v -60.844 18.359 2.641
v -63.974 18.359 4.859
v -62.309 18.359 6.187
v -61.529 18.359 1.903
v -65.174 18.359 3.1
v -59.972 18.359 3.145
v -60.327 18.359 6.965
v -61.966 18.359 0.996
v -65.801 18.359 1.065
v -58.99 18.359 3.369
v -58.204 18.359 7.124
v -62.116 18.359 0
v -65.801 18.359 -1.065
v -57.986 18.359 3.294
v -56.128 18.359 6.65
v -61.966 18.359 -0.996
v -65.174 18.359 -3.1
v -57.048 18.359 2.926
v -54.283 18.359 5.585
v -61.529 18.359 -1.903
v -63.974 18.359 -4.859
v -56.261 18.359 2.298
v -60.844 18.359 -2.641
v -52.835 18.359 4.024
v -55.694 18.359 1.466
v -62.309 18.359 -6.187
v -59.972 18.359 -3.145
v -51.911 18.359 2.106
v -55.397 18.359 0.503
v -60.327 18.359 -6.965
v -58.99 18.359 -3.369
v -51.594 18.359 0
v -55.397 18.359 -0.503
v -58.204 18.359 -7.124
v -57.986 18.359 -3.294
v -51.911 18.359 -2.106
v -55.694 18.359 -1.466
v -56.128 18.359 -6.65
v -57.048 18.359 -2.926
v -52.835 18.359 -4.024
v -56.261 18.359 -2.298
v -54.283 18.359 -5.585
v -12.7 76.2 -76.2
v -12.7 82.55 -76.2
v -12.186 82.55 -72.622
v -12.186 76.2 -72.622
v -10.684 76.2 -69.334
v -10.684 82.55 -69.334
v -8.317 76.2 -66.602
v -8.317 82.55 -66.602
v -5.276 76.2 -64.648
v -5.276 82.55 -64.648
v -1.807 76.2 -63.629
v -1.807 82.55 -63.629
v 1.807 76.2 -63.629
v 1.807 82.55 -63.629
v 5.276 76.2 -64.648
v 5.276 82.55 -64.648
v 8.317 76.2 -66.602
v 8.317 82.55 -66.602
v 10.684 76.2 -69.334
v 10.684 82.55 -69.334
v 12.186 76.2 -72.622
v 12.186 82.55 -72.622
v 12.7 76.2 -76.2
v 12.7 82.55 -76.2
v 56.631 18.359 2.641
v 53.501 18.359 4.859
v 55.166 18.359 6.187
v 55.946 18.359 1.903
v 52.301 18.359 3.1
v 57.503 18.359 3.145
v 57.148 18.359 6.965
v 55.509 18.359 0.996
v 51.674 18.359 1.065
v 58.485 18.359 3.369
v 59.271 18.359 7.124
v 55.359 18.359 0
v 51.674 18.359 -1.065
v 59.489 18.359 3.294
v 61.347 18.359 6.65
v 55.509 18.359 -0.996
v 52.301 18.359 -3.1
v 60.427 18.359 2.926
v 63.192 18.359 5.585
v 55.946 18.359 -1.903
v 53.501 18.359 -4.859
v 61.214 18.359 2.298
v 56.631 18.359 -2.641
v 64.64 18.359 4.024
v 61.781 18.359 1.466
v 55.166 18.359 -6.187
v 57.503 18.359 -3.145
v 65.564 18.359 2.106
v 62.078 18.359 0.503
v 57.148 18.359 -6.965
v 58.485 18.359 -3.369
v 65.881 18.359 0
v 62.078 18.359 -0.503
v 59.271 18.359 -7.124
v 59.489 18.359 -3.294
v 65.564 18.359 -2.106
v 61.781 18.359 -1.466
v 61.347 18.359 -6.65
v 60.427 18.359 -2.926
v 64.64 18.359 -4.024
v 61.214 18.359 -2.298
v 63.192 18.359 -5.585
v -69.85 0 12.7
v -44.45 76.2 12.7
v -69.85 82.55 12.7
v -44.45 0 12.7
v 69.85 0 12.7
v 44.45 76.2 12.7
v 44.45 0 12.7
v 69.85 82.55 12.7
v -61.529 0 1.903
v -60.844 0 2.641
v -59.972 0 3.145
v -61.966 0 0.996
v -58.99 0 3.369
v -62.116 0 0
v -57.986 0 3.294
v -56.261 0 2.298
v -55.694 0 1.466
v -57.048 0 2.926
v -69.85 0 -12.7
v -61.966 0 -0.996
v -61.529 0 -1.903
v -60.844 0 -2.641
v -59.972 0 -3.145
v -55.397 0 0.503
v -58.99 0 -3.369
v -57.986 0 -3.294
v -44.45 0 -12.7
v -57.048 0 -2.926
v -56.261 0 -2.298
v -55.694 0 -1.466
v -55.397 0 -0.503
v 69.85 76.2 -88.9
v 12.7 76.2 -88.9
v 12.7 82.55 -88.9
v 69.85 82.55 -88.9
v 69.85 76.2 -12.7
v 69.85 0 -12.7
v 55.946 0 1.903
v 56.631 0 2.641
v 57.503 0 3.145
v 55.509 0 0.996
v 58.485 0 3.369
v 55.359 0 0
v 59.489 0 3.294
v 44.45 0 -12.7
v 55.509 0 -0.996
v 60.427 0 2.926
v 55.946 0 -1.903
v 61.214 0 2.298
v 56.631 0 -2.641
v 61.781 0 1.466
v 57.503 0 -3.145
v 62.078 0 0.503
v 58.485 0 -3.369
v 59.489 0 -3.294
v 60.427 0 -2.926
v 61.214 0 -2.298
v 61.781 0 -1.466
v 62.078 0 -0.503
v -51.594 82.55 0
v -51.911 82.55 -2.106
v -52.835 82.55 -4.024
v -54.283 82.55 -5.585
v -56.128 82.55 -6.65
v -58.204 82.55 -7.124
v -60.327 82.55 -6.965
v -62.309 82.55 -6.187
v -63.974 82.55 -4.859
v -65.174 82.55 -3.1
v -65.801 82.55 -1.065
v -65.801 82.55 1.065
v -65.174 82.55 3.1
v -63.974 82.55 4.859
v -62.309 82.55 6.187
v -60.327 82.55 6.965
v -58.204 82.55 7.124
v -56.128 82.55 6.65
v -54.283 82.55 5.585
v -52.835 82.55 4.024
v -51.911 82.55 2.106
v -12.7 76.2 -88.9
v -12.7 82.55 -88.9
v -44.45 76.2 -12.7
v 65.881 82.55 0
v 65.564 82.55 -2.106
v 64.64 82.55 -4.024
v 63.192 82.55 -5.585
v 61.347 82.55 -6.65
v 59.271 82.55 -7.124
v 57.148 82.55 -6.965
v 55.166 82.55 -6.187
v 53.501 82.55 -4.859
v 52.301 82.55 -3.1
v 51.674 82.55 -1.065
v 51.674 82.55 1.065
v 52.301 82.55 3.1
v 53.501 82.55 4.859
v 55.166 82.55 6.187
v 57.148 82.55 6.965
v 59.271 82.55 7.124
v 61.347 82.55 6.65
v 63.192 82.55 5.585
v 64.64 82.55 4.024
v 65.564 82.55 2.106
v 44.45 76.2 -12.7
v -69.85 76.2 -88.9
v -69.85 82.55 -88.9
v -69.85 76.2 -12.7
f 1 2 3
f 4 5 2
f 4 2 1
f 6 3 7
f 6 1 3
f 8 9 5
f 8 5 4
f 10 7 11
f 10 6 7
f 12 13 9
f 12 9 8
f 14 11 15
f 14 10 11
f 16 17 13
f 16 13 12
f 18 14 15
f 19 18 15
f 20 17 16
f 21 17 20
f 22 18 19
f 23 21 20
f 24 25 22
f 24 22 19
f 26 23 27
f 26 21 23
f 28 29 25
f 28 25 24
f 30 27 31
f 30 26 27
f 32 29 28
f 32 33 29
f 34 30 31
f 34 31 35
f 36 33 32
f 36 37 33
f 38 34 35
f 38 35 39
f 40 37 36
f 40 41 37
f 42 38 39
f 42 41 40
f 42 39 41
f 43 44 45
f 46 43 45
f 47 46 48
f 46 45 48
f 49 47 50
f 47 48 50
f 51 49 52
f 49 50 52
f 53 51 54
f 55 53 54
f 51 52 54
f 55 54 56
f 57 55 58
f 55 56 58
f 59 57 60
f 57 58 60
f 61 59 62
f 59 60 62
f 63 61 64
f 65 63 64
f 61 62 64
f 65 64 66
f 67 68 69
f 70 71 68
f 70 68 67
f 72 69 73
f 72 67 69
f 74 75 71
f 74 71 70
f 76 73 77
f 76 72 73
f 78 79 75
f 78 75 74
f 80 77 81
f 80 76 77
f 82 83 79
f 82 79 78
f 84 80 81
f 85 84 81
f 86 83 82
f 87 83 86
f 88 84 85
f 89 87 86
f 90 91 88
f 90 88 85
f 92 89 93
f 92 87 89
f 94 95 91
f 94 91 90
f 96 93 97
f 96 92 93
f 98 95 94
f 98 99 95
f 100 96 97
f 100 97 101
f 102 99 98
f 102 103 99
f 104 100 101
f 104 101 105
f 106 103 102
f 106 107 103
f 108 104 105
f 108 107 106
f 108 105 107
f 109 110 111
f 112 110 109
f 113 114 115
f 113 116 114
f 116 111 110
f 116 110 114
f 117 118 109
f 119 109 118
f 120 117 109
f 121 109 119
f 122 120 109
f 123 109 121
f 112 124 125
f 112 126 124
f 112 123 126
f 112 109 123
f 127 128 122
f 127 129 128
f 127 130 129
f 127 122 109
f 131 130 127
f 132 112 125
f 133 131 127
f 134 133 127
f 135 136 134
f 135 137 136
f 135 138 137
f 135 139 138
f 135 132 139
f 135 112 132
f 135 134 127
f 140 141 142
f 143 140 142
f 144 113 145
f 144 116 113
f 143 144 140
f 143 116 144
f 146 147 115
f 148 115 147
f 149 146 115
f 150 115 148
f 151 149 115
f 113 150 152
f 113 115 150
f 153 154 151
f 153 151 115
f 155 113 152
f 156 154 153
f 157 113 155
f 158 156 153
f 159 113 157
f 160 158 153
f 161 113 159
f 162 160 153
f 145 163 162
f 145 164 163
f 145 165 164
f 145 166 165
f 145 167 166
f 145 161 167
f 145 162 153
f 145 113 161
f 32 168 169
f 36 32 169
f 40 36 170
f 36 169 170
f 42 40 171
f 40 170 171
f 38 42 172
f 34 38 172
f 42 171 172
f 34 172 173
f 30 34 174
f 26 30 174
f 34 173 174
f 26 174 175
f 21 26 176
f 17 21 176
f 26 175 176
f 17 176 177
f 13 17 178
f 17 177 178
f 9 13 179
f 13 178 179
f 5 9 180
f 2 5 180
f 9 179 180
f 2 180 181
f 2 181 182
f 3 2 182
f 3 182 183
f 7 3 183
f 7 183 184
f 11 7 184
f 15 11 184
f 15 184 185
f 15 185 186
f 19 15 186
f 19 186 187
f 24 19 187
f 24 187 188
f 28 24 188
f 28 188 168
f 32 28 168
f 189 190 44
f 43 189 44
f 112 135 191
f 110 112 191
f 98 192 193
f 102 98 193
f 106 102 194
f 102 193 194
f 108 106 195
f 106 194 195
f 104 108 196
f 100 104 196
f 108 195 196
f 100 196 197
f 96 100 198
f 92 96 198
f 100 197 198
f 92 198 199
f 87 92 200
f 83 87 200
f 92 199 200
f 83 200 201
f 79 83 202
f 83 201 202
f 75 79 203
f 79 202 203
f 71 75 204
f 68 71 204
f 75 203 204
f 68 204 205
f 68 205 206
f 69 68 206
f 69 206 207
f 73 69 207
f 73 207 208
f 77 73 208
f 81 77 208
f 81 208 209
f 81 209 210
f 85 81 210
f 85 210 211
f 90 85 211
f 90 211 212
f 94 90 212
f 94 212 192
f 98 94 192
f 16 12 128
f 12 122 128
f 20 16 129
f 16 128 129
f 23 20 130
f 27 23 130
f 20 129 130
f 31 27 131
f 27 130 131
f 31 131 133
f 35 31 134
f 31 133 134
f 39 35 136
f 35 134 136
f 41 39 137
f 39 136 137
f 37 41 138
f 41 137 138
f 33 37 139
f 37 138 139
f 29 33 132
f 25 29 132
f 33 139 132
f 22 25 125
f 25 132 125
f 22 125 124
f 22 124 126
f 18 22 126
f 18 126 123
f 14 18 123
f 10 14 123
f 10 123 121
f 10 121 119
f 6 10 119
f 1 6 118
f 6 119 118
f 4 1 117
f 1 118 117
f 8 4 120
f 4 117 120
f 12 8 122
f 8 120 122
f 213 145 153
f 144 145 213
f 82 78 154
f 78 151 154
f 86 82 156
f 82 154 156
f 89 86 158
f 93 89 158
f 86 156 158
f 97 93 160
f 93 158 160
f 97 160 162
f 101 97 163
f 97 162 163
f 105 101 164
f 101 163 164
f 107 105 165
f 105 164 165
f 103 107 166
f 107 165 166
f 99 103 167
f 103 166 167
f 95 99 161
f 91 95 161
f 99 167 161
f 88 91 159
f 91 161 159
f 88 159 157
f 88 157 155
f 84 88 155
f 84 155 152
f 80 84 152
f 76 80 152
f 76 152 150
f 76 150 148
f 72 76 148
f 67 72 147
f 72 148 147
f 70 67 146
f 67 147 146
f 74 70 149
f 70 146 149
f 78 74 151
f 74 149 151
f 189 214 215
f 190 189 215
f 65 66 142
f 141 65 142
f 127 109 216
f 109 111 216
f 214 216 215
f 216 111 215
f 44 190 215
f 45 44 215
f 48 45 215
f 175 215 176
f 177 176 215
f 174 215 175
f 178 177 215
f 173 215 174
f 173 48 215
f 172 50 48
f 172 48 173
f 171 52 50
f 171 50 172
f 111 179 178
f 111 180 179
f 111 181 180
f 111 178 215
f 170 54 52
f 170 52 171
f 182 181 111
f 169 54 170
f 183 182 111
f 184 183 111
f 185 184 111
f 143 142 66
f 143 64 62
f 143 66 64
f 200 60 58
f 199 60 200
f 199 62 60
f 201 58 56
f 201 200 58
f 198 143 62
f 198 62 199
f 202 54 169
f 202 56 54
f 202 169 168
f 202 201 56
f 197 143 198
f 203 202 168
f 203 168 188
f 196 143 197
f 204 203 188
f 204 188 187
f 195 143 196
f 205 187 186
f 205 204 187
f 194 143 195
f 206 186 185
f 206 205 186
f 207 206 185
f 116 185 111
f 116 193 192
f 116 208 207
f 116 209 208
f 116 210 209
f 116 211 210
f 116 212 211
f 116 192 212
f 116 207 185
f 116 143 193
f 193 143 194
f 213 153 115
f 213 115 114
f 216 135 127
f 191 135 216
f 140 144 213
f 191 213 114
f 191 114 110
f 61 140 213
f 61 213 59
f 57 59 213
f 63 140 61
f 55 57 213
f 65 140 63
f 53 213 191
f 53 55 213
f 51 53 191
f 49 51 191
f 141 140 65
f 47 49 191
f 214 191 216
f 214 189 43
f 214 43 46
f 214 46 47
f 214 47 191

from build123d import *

# Parameters (mm, degrees)
BOSS_EXTRUDE1_DEPTH                                  = 69.85
SKETCH2_W                                            = 88.9
SKETCH2_H                                            = 76.2
CUT_EXTRUDE1_DEPTH                                   = 149.378182358
CBORE_FOR_1_4_BINDING_HEAD_MACHINE_SCREW_D           = 6.7564
CBORE_FOR_1_4_BINDING_HEAD_MACHINE_SCREW_CBORE_D     = 14.2875
CBORE_FOR_1_4_BINDING_HEAD_MACHINE_SCREW_CBORE_DEPTH = 64.191007
CUT_EXTRUDE2_DEPTH                                   = 140.9883388


with BuildPart() as part:
    # Sketch1 → Boss-Extrude1 (new, symmetric)
    with BuildSketch(Plane(origin=(0, 0, 0), x_dir=(0, 0, -1), z_dir=(1, 0, 0))):
        Polygon((-12.7, 0), (12.7, 0), (12.7, 76.2), (88.9, 76.2), (88.9, 82.55), (-12.7, 82.55), align=None)
    extrude(amount=BOSS_EXTRUDE1_DEPTH, both=True)

    # Sketch2 → Cut-Extrude1 (cut, through all)
    with BuildSketch(Plane(origin=(0, 0, -88.9), x_dir=(-1, 0, 0), z_dir=(0, 0, -1))):
        with Locations((0, 38.1)):
            Rectangle(SKETCH2_W, SKETCH2_H)
    extrude(amount=-CUT_EXTRUDE1_DEPTH, mode=Mode.SUBTRACT)

    # CBORE for 1/4 Binding Head Machine Screw1 (through all)
    with Locations(Plane(origin=(0, 82.55, 0), x_dir=(1, 0, 0), z_dir=(0, 1, 0))):
        with Locations((58.7375, 0), (-58.7375, 0)):
            CounterBoreHole(CBORE_FOR_1_4_BINDING_HEAD_MACHINE_SCREW_D / 2, CBORE_FOR_1_4_BINDING_HEAD_MACHINE_SCREW_CBORE_D / 2, CBORE_FOR_1_4_BINDING_HEAD_MACHINE_SCREW_CBORE_DEPTH)

    # Sketch6 → Cut-Extrude2 (cut, through all)
    with BuildSketch(Plane(origin=(0, 82.55, 0), x_dir=(1, 0, 0), z_dir=(0, 1, 0))):
        with BuildLine():
            Line((12.7, 76.2), (12.7, 88.9))
            Line((12.7, 88.9), (-12.7, 88.9))
            Line((-12.7, 88.9), (-12.7, 76.2))
            ThreePointArc((-12.7, 76.2), (0, 63.5), (12.7, 76.2))
        make_face()
    extrude(amount=-CUT_EXTRUDE2_DEPTH, mode=Mode.SUBTRACT)


solid = part.part
